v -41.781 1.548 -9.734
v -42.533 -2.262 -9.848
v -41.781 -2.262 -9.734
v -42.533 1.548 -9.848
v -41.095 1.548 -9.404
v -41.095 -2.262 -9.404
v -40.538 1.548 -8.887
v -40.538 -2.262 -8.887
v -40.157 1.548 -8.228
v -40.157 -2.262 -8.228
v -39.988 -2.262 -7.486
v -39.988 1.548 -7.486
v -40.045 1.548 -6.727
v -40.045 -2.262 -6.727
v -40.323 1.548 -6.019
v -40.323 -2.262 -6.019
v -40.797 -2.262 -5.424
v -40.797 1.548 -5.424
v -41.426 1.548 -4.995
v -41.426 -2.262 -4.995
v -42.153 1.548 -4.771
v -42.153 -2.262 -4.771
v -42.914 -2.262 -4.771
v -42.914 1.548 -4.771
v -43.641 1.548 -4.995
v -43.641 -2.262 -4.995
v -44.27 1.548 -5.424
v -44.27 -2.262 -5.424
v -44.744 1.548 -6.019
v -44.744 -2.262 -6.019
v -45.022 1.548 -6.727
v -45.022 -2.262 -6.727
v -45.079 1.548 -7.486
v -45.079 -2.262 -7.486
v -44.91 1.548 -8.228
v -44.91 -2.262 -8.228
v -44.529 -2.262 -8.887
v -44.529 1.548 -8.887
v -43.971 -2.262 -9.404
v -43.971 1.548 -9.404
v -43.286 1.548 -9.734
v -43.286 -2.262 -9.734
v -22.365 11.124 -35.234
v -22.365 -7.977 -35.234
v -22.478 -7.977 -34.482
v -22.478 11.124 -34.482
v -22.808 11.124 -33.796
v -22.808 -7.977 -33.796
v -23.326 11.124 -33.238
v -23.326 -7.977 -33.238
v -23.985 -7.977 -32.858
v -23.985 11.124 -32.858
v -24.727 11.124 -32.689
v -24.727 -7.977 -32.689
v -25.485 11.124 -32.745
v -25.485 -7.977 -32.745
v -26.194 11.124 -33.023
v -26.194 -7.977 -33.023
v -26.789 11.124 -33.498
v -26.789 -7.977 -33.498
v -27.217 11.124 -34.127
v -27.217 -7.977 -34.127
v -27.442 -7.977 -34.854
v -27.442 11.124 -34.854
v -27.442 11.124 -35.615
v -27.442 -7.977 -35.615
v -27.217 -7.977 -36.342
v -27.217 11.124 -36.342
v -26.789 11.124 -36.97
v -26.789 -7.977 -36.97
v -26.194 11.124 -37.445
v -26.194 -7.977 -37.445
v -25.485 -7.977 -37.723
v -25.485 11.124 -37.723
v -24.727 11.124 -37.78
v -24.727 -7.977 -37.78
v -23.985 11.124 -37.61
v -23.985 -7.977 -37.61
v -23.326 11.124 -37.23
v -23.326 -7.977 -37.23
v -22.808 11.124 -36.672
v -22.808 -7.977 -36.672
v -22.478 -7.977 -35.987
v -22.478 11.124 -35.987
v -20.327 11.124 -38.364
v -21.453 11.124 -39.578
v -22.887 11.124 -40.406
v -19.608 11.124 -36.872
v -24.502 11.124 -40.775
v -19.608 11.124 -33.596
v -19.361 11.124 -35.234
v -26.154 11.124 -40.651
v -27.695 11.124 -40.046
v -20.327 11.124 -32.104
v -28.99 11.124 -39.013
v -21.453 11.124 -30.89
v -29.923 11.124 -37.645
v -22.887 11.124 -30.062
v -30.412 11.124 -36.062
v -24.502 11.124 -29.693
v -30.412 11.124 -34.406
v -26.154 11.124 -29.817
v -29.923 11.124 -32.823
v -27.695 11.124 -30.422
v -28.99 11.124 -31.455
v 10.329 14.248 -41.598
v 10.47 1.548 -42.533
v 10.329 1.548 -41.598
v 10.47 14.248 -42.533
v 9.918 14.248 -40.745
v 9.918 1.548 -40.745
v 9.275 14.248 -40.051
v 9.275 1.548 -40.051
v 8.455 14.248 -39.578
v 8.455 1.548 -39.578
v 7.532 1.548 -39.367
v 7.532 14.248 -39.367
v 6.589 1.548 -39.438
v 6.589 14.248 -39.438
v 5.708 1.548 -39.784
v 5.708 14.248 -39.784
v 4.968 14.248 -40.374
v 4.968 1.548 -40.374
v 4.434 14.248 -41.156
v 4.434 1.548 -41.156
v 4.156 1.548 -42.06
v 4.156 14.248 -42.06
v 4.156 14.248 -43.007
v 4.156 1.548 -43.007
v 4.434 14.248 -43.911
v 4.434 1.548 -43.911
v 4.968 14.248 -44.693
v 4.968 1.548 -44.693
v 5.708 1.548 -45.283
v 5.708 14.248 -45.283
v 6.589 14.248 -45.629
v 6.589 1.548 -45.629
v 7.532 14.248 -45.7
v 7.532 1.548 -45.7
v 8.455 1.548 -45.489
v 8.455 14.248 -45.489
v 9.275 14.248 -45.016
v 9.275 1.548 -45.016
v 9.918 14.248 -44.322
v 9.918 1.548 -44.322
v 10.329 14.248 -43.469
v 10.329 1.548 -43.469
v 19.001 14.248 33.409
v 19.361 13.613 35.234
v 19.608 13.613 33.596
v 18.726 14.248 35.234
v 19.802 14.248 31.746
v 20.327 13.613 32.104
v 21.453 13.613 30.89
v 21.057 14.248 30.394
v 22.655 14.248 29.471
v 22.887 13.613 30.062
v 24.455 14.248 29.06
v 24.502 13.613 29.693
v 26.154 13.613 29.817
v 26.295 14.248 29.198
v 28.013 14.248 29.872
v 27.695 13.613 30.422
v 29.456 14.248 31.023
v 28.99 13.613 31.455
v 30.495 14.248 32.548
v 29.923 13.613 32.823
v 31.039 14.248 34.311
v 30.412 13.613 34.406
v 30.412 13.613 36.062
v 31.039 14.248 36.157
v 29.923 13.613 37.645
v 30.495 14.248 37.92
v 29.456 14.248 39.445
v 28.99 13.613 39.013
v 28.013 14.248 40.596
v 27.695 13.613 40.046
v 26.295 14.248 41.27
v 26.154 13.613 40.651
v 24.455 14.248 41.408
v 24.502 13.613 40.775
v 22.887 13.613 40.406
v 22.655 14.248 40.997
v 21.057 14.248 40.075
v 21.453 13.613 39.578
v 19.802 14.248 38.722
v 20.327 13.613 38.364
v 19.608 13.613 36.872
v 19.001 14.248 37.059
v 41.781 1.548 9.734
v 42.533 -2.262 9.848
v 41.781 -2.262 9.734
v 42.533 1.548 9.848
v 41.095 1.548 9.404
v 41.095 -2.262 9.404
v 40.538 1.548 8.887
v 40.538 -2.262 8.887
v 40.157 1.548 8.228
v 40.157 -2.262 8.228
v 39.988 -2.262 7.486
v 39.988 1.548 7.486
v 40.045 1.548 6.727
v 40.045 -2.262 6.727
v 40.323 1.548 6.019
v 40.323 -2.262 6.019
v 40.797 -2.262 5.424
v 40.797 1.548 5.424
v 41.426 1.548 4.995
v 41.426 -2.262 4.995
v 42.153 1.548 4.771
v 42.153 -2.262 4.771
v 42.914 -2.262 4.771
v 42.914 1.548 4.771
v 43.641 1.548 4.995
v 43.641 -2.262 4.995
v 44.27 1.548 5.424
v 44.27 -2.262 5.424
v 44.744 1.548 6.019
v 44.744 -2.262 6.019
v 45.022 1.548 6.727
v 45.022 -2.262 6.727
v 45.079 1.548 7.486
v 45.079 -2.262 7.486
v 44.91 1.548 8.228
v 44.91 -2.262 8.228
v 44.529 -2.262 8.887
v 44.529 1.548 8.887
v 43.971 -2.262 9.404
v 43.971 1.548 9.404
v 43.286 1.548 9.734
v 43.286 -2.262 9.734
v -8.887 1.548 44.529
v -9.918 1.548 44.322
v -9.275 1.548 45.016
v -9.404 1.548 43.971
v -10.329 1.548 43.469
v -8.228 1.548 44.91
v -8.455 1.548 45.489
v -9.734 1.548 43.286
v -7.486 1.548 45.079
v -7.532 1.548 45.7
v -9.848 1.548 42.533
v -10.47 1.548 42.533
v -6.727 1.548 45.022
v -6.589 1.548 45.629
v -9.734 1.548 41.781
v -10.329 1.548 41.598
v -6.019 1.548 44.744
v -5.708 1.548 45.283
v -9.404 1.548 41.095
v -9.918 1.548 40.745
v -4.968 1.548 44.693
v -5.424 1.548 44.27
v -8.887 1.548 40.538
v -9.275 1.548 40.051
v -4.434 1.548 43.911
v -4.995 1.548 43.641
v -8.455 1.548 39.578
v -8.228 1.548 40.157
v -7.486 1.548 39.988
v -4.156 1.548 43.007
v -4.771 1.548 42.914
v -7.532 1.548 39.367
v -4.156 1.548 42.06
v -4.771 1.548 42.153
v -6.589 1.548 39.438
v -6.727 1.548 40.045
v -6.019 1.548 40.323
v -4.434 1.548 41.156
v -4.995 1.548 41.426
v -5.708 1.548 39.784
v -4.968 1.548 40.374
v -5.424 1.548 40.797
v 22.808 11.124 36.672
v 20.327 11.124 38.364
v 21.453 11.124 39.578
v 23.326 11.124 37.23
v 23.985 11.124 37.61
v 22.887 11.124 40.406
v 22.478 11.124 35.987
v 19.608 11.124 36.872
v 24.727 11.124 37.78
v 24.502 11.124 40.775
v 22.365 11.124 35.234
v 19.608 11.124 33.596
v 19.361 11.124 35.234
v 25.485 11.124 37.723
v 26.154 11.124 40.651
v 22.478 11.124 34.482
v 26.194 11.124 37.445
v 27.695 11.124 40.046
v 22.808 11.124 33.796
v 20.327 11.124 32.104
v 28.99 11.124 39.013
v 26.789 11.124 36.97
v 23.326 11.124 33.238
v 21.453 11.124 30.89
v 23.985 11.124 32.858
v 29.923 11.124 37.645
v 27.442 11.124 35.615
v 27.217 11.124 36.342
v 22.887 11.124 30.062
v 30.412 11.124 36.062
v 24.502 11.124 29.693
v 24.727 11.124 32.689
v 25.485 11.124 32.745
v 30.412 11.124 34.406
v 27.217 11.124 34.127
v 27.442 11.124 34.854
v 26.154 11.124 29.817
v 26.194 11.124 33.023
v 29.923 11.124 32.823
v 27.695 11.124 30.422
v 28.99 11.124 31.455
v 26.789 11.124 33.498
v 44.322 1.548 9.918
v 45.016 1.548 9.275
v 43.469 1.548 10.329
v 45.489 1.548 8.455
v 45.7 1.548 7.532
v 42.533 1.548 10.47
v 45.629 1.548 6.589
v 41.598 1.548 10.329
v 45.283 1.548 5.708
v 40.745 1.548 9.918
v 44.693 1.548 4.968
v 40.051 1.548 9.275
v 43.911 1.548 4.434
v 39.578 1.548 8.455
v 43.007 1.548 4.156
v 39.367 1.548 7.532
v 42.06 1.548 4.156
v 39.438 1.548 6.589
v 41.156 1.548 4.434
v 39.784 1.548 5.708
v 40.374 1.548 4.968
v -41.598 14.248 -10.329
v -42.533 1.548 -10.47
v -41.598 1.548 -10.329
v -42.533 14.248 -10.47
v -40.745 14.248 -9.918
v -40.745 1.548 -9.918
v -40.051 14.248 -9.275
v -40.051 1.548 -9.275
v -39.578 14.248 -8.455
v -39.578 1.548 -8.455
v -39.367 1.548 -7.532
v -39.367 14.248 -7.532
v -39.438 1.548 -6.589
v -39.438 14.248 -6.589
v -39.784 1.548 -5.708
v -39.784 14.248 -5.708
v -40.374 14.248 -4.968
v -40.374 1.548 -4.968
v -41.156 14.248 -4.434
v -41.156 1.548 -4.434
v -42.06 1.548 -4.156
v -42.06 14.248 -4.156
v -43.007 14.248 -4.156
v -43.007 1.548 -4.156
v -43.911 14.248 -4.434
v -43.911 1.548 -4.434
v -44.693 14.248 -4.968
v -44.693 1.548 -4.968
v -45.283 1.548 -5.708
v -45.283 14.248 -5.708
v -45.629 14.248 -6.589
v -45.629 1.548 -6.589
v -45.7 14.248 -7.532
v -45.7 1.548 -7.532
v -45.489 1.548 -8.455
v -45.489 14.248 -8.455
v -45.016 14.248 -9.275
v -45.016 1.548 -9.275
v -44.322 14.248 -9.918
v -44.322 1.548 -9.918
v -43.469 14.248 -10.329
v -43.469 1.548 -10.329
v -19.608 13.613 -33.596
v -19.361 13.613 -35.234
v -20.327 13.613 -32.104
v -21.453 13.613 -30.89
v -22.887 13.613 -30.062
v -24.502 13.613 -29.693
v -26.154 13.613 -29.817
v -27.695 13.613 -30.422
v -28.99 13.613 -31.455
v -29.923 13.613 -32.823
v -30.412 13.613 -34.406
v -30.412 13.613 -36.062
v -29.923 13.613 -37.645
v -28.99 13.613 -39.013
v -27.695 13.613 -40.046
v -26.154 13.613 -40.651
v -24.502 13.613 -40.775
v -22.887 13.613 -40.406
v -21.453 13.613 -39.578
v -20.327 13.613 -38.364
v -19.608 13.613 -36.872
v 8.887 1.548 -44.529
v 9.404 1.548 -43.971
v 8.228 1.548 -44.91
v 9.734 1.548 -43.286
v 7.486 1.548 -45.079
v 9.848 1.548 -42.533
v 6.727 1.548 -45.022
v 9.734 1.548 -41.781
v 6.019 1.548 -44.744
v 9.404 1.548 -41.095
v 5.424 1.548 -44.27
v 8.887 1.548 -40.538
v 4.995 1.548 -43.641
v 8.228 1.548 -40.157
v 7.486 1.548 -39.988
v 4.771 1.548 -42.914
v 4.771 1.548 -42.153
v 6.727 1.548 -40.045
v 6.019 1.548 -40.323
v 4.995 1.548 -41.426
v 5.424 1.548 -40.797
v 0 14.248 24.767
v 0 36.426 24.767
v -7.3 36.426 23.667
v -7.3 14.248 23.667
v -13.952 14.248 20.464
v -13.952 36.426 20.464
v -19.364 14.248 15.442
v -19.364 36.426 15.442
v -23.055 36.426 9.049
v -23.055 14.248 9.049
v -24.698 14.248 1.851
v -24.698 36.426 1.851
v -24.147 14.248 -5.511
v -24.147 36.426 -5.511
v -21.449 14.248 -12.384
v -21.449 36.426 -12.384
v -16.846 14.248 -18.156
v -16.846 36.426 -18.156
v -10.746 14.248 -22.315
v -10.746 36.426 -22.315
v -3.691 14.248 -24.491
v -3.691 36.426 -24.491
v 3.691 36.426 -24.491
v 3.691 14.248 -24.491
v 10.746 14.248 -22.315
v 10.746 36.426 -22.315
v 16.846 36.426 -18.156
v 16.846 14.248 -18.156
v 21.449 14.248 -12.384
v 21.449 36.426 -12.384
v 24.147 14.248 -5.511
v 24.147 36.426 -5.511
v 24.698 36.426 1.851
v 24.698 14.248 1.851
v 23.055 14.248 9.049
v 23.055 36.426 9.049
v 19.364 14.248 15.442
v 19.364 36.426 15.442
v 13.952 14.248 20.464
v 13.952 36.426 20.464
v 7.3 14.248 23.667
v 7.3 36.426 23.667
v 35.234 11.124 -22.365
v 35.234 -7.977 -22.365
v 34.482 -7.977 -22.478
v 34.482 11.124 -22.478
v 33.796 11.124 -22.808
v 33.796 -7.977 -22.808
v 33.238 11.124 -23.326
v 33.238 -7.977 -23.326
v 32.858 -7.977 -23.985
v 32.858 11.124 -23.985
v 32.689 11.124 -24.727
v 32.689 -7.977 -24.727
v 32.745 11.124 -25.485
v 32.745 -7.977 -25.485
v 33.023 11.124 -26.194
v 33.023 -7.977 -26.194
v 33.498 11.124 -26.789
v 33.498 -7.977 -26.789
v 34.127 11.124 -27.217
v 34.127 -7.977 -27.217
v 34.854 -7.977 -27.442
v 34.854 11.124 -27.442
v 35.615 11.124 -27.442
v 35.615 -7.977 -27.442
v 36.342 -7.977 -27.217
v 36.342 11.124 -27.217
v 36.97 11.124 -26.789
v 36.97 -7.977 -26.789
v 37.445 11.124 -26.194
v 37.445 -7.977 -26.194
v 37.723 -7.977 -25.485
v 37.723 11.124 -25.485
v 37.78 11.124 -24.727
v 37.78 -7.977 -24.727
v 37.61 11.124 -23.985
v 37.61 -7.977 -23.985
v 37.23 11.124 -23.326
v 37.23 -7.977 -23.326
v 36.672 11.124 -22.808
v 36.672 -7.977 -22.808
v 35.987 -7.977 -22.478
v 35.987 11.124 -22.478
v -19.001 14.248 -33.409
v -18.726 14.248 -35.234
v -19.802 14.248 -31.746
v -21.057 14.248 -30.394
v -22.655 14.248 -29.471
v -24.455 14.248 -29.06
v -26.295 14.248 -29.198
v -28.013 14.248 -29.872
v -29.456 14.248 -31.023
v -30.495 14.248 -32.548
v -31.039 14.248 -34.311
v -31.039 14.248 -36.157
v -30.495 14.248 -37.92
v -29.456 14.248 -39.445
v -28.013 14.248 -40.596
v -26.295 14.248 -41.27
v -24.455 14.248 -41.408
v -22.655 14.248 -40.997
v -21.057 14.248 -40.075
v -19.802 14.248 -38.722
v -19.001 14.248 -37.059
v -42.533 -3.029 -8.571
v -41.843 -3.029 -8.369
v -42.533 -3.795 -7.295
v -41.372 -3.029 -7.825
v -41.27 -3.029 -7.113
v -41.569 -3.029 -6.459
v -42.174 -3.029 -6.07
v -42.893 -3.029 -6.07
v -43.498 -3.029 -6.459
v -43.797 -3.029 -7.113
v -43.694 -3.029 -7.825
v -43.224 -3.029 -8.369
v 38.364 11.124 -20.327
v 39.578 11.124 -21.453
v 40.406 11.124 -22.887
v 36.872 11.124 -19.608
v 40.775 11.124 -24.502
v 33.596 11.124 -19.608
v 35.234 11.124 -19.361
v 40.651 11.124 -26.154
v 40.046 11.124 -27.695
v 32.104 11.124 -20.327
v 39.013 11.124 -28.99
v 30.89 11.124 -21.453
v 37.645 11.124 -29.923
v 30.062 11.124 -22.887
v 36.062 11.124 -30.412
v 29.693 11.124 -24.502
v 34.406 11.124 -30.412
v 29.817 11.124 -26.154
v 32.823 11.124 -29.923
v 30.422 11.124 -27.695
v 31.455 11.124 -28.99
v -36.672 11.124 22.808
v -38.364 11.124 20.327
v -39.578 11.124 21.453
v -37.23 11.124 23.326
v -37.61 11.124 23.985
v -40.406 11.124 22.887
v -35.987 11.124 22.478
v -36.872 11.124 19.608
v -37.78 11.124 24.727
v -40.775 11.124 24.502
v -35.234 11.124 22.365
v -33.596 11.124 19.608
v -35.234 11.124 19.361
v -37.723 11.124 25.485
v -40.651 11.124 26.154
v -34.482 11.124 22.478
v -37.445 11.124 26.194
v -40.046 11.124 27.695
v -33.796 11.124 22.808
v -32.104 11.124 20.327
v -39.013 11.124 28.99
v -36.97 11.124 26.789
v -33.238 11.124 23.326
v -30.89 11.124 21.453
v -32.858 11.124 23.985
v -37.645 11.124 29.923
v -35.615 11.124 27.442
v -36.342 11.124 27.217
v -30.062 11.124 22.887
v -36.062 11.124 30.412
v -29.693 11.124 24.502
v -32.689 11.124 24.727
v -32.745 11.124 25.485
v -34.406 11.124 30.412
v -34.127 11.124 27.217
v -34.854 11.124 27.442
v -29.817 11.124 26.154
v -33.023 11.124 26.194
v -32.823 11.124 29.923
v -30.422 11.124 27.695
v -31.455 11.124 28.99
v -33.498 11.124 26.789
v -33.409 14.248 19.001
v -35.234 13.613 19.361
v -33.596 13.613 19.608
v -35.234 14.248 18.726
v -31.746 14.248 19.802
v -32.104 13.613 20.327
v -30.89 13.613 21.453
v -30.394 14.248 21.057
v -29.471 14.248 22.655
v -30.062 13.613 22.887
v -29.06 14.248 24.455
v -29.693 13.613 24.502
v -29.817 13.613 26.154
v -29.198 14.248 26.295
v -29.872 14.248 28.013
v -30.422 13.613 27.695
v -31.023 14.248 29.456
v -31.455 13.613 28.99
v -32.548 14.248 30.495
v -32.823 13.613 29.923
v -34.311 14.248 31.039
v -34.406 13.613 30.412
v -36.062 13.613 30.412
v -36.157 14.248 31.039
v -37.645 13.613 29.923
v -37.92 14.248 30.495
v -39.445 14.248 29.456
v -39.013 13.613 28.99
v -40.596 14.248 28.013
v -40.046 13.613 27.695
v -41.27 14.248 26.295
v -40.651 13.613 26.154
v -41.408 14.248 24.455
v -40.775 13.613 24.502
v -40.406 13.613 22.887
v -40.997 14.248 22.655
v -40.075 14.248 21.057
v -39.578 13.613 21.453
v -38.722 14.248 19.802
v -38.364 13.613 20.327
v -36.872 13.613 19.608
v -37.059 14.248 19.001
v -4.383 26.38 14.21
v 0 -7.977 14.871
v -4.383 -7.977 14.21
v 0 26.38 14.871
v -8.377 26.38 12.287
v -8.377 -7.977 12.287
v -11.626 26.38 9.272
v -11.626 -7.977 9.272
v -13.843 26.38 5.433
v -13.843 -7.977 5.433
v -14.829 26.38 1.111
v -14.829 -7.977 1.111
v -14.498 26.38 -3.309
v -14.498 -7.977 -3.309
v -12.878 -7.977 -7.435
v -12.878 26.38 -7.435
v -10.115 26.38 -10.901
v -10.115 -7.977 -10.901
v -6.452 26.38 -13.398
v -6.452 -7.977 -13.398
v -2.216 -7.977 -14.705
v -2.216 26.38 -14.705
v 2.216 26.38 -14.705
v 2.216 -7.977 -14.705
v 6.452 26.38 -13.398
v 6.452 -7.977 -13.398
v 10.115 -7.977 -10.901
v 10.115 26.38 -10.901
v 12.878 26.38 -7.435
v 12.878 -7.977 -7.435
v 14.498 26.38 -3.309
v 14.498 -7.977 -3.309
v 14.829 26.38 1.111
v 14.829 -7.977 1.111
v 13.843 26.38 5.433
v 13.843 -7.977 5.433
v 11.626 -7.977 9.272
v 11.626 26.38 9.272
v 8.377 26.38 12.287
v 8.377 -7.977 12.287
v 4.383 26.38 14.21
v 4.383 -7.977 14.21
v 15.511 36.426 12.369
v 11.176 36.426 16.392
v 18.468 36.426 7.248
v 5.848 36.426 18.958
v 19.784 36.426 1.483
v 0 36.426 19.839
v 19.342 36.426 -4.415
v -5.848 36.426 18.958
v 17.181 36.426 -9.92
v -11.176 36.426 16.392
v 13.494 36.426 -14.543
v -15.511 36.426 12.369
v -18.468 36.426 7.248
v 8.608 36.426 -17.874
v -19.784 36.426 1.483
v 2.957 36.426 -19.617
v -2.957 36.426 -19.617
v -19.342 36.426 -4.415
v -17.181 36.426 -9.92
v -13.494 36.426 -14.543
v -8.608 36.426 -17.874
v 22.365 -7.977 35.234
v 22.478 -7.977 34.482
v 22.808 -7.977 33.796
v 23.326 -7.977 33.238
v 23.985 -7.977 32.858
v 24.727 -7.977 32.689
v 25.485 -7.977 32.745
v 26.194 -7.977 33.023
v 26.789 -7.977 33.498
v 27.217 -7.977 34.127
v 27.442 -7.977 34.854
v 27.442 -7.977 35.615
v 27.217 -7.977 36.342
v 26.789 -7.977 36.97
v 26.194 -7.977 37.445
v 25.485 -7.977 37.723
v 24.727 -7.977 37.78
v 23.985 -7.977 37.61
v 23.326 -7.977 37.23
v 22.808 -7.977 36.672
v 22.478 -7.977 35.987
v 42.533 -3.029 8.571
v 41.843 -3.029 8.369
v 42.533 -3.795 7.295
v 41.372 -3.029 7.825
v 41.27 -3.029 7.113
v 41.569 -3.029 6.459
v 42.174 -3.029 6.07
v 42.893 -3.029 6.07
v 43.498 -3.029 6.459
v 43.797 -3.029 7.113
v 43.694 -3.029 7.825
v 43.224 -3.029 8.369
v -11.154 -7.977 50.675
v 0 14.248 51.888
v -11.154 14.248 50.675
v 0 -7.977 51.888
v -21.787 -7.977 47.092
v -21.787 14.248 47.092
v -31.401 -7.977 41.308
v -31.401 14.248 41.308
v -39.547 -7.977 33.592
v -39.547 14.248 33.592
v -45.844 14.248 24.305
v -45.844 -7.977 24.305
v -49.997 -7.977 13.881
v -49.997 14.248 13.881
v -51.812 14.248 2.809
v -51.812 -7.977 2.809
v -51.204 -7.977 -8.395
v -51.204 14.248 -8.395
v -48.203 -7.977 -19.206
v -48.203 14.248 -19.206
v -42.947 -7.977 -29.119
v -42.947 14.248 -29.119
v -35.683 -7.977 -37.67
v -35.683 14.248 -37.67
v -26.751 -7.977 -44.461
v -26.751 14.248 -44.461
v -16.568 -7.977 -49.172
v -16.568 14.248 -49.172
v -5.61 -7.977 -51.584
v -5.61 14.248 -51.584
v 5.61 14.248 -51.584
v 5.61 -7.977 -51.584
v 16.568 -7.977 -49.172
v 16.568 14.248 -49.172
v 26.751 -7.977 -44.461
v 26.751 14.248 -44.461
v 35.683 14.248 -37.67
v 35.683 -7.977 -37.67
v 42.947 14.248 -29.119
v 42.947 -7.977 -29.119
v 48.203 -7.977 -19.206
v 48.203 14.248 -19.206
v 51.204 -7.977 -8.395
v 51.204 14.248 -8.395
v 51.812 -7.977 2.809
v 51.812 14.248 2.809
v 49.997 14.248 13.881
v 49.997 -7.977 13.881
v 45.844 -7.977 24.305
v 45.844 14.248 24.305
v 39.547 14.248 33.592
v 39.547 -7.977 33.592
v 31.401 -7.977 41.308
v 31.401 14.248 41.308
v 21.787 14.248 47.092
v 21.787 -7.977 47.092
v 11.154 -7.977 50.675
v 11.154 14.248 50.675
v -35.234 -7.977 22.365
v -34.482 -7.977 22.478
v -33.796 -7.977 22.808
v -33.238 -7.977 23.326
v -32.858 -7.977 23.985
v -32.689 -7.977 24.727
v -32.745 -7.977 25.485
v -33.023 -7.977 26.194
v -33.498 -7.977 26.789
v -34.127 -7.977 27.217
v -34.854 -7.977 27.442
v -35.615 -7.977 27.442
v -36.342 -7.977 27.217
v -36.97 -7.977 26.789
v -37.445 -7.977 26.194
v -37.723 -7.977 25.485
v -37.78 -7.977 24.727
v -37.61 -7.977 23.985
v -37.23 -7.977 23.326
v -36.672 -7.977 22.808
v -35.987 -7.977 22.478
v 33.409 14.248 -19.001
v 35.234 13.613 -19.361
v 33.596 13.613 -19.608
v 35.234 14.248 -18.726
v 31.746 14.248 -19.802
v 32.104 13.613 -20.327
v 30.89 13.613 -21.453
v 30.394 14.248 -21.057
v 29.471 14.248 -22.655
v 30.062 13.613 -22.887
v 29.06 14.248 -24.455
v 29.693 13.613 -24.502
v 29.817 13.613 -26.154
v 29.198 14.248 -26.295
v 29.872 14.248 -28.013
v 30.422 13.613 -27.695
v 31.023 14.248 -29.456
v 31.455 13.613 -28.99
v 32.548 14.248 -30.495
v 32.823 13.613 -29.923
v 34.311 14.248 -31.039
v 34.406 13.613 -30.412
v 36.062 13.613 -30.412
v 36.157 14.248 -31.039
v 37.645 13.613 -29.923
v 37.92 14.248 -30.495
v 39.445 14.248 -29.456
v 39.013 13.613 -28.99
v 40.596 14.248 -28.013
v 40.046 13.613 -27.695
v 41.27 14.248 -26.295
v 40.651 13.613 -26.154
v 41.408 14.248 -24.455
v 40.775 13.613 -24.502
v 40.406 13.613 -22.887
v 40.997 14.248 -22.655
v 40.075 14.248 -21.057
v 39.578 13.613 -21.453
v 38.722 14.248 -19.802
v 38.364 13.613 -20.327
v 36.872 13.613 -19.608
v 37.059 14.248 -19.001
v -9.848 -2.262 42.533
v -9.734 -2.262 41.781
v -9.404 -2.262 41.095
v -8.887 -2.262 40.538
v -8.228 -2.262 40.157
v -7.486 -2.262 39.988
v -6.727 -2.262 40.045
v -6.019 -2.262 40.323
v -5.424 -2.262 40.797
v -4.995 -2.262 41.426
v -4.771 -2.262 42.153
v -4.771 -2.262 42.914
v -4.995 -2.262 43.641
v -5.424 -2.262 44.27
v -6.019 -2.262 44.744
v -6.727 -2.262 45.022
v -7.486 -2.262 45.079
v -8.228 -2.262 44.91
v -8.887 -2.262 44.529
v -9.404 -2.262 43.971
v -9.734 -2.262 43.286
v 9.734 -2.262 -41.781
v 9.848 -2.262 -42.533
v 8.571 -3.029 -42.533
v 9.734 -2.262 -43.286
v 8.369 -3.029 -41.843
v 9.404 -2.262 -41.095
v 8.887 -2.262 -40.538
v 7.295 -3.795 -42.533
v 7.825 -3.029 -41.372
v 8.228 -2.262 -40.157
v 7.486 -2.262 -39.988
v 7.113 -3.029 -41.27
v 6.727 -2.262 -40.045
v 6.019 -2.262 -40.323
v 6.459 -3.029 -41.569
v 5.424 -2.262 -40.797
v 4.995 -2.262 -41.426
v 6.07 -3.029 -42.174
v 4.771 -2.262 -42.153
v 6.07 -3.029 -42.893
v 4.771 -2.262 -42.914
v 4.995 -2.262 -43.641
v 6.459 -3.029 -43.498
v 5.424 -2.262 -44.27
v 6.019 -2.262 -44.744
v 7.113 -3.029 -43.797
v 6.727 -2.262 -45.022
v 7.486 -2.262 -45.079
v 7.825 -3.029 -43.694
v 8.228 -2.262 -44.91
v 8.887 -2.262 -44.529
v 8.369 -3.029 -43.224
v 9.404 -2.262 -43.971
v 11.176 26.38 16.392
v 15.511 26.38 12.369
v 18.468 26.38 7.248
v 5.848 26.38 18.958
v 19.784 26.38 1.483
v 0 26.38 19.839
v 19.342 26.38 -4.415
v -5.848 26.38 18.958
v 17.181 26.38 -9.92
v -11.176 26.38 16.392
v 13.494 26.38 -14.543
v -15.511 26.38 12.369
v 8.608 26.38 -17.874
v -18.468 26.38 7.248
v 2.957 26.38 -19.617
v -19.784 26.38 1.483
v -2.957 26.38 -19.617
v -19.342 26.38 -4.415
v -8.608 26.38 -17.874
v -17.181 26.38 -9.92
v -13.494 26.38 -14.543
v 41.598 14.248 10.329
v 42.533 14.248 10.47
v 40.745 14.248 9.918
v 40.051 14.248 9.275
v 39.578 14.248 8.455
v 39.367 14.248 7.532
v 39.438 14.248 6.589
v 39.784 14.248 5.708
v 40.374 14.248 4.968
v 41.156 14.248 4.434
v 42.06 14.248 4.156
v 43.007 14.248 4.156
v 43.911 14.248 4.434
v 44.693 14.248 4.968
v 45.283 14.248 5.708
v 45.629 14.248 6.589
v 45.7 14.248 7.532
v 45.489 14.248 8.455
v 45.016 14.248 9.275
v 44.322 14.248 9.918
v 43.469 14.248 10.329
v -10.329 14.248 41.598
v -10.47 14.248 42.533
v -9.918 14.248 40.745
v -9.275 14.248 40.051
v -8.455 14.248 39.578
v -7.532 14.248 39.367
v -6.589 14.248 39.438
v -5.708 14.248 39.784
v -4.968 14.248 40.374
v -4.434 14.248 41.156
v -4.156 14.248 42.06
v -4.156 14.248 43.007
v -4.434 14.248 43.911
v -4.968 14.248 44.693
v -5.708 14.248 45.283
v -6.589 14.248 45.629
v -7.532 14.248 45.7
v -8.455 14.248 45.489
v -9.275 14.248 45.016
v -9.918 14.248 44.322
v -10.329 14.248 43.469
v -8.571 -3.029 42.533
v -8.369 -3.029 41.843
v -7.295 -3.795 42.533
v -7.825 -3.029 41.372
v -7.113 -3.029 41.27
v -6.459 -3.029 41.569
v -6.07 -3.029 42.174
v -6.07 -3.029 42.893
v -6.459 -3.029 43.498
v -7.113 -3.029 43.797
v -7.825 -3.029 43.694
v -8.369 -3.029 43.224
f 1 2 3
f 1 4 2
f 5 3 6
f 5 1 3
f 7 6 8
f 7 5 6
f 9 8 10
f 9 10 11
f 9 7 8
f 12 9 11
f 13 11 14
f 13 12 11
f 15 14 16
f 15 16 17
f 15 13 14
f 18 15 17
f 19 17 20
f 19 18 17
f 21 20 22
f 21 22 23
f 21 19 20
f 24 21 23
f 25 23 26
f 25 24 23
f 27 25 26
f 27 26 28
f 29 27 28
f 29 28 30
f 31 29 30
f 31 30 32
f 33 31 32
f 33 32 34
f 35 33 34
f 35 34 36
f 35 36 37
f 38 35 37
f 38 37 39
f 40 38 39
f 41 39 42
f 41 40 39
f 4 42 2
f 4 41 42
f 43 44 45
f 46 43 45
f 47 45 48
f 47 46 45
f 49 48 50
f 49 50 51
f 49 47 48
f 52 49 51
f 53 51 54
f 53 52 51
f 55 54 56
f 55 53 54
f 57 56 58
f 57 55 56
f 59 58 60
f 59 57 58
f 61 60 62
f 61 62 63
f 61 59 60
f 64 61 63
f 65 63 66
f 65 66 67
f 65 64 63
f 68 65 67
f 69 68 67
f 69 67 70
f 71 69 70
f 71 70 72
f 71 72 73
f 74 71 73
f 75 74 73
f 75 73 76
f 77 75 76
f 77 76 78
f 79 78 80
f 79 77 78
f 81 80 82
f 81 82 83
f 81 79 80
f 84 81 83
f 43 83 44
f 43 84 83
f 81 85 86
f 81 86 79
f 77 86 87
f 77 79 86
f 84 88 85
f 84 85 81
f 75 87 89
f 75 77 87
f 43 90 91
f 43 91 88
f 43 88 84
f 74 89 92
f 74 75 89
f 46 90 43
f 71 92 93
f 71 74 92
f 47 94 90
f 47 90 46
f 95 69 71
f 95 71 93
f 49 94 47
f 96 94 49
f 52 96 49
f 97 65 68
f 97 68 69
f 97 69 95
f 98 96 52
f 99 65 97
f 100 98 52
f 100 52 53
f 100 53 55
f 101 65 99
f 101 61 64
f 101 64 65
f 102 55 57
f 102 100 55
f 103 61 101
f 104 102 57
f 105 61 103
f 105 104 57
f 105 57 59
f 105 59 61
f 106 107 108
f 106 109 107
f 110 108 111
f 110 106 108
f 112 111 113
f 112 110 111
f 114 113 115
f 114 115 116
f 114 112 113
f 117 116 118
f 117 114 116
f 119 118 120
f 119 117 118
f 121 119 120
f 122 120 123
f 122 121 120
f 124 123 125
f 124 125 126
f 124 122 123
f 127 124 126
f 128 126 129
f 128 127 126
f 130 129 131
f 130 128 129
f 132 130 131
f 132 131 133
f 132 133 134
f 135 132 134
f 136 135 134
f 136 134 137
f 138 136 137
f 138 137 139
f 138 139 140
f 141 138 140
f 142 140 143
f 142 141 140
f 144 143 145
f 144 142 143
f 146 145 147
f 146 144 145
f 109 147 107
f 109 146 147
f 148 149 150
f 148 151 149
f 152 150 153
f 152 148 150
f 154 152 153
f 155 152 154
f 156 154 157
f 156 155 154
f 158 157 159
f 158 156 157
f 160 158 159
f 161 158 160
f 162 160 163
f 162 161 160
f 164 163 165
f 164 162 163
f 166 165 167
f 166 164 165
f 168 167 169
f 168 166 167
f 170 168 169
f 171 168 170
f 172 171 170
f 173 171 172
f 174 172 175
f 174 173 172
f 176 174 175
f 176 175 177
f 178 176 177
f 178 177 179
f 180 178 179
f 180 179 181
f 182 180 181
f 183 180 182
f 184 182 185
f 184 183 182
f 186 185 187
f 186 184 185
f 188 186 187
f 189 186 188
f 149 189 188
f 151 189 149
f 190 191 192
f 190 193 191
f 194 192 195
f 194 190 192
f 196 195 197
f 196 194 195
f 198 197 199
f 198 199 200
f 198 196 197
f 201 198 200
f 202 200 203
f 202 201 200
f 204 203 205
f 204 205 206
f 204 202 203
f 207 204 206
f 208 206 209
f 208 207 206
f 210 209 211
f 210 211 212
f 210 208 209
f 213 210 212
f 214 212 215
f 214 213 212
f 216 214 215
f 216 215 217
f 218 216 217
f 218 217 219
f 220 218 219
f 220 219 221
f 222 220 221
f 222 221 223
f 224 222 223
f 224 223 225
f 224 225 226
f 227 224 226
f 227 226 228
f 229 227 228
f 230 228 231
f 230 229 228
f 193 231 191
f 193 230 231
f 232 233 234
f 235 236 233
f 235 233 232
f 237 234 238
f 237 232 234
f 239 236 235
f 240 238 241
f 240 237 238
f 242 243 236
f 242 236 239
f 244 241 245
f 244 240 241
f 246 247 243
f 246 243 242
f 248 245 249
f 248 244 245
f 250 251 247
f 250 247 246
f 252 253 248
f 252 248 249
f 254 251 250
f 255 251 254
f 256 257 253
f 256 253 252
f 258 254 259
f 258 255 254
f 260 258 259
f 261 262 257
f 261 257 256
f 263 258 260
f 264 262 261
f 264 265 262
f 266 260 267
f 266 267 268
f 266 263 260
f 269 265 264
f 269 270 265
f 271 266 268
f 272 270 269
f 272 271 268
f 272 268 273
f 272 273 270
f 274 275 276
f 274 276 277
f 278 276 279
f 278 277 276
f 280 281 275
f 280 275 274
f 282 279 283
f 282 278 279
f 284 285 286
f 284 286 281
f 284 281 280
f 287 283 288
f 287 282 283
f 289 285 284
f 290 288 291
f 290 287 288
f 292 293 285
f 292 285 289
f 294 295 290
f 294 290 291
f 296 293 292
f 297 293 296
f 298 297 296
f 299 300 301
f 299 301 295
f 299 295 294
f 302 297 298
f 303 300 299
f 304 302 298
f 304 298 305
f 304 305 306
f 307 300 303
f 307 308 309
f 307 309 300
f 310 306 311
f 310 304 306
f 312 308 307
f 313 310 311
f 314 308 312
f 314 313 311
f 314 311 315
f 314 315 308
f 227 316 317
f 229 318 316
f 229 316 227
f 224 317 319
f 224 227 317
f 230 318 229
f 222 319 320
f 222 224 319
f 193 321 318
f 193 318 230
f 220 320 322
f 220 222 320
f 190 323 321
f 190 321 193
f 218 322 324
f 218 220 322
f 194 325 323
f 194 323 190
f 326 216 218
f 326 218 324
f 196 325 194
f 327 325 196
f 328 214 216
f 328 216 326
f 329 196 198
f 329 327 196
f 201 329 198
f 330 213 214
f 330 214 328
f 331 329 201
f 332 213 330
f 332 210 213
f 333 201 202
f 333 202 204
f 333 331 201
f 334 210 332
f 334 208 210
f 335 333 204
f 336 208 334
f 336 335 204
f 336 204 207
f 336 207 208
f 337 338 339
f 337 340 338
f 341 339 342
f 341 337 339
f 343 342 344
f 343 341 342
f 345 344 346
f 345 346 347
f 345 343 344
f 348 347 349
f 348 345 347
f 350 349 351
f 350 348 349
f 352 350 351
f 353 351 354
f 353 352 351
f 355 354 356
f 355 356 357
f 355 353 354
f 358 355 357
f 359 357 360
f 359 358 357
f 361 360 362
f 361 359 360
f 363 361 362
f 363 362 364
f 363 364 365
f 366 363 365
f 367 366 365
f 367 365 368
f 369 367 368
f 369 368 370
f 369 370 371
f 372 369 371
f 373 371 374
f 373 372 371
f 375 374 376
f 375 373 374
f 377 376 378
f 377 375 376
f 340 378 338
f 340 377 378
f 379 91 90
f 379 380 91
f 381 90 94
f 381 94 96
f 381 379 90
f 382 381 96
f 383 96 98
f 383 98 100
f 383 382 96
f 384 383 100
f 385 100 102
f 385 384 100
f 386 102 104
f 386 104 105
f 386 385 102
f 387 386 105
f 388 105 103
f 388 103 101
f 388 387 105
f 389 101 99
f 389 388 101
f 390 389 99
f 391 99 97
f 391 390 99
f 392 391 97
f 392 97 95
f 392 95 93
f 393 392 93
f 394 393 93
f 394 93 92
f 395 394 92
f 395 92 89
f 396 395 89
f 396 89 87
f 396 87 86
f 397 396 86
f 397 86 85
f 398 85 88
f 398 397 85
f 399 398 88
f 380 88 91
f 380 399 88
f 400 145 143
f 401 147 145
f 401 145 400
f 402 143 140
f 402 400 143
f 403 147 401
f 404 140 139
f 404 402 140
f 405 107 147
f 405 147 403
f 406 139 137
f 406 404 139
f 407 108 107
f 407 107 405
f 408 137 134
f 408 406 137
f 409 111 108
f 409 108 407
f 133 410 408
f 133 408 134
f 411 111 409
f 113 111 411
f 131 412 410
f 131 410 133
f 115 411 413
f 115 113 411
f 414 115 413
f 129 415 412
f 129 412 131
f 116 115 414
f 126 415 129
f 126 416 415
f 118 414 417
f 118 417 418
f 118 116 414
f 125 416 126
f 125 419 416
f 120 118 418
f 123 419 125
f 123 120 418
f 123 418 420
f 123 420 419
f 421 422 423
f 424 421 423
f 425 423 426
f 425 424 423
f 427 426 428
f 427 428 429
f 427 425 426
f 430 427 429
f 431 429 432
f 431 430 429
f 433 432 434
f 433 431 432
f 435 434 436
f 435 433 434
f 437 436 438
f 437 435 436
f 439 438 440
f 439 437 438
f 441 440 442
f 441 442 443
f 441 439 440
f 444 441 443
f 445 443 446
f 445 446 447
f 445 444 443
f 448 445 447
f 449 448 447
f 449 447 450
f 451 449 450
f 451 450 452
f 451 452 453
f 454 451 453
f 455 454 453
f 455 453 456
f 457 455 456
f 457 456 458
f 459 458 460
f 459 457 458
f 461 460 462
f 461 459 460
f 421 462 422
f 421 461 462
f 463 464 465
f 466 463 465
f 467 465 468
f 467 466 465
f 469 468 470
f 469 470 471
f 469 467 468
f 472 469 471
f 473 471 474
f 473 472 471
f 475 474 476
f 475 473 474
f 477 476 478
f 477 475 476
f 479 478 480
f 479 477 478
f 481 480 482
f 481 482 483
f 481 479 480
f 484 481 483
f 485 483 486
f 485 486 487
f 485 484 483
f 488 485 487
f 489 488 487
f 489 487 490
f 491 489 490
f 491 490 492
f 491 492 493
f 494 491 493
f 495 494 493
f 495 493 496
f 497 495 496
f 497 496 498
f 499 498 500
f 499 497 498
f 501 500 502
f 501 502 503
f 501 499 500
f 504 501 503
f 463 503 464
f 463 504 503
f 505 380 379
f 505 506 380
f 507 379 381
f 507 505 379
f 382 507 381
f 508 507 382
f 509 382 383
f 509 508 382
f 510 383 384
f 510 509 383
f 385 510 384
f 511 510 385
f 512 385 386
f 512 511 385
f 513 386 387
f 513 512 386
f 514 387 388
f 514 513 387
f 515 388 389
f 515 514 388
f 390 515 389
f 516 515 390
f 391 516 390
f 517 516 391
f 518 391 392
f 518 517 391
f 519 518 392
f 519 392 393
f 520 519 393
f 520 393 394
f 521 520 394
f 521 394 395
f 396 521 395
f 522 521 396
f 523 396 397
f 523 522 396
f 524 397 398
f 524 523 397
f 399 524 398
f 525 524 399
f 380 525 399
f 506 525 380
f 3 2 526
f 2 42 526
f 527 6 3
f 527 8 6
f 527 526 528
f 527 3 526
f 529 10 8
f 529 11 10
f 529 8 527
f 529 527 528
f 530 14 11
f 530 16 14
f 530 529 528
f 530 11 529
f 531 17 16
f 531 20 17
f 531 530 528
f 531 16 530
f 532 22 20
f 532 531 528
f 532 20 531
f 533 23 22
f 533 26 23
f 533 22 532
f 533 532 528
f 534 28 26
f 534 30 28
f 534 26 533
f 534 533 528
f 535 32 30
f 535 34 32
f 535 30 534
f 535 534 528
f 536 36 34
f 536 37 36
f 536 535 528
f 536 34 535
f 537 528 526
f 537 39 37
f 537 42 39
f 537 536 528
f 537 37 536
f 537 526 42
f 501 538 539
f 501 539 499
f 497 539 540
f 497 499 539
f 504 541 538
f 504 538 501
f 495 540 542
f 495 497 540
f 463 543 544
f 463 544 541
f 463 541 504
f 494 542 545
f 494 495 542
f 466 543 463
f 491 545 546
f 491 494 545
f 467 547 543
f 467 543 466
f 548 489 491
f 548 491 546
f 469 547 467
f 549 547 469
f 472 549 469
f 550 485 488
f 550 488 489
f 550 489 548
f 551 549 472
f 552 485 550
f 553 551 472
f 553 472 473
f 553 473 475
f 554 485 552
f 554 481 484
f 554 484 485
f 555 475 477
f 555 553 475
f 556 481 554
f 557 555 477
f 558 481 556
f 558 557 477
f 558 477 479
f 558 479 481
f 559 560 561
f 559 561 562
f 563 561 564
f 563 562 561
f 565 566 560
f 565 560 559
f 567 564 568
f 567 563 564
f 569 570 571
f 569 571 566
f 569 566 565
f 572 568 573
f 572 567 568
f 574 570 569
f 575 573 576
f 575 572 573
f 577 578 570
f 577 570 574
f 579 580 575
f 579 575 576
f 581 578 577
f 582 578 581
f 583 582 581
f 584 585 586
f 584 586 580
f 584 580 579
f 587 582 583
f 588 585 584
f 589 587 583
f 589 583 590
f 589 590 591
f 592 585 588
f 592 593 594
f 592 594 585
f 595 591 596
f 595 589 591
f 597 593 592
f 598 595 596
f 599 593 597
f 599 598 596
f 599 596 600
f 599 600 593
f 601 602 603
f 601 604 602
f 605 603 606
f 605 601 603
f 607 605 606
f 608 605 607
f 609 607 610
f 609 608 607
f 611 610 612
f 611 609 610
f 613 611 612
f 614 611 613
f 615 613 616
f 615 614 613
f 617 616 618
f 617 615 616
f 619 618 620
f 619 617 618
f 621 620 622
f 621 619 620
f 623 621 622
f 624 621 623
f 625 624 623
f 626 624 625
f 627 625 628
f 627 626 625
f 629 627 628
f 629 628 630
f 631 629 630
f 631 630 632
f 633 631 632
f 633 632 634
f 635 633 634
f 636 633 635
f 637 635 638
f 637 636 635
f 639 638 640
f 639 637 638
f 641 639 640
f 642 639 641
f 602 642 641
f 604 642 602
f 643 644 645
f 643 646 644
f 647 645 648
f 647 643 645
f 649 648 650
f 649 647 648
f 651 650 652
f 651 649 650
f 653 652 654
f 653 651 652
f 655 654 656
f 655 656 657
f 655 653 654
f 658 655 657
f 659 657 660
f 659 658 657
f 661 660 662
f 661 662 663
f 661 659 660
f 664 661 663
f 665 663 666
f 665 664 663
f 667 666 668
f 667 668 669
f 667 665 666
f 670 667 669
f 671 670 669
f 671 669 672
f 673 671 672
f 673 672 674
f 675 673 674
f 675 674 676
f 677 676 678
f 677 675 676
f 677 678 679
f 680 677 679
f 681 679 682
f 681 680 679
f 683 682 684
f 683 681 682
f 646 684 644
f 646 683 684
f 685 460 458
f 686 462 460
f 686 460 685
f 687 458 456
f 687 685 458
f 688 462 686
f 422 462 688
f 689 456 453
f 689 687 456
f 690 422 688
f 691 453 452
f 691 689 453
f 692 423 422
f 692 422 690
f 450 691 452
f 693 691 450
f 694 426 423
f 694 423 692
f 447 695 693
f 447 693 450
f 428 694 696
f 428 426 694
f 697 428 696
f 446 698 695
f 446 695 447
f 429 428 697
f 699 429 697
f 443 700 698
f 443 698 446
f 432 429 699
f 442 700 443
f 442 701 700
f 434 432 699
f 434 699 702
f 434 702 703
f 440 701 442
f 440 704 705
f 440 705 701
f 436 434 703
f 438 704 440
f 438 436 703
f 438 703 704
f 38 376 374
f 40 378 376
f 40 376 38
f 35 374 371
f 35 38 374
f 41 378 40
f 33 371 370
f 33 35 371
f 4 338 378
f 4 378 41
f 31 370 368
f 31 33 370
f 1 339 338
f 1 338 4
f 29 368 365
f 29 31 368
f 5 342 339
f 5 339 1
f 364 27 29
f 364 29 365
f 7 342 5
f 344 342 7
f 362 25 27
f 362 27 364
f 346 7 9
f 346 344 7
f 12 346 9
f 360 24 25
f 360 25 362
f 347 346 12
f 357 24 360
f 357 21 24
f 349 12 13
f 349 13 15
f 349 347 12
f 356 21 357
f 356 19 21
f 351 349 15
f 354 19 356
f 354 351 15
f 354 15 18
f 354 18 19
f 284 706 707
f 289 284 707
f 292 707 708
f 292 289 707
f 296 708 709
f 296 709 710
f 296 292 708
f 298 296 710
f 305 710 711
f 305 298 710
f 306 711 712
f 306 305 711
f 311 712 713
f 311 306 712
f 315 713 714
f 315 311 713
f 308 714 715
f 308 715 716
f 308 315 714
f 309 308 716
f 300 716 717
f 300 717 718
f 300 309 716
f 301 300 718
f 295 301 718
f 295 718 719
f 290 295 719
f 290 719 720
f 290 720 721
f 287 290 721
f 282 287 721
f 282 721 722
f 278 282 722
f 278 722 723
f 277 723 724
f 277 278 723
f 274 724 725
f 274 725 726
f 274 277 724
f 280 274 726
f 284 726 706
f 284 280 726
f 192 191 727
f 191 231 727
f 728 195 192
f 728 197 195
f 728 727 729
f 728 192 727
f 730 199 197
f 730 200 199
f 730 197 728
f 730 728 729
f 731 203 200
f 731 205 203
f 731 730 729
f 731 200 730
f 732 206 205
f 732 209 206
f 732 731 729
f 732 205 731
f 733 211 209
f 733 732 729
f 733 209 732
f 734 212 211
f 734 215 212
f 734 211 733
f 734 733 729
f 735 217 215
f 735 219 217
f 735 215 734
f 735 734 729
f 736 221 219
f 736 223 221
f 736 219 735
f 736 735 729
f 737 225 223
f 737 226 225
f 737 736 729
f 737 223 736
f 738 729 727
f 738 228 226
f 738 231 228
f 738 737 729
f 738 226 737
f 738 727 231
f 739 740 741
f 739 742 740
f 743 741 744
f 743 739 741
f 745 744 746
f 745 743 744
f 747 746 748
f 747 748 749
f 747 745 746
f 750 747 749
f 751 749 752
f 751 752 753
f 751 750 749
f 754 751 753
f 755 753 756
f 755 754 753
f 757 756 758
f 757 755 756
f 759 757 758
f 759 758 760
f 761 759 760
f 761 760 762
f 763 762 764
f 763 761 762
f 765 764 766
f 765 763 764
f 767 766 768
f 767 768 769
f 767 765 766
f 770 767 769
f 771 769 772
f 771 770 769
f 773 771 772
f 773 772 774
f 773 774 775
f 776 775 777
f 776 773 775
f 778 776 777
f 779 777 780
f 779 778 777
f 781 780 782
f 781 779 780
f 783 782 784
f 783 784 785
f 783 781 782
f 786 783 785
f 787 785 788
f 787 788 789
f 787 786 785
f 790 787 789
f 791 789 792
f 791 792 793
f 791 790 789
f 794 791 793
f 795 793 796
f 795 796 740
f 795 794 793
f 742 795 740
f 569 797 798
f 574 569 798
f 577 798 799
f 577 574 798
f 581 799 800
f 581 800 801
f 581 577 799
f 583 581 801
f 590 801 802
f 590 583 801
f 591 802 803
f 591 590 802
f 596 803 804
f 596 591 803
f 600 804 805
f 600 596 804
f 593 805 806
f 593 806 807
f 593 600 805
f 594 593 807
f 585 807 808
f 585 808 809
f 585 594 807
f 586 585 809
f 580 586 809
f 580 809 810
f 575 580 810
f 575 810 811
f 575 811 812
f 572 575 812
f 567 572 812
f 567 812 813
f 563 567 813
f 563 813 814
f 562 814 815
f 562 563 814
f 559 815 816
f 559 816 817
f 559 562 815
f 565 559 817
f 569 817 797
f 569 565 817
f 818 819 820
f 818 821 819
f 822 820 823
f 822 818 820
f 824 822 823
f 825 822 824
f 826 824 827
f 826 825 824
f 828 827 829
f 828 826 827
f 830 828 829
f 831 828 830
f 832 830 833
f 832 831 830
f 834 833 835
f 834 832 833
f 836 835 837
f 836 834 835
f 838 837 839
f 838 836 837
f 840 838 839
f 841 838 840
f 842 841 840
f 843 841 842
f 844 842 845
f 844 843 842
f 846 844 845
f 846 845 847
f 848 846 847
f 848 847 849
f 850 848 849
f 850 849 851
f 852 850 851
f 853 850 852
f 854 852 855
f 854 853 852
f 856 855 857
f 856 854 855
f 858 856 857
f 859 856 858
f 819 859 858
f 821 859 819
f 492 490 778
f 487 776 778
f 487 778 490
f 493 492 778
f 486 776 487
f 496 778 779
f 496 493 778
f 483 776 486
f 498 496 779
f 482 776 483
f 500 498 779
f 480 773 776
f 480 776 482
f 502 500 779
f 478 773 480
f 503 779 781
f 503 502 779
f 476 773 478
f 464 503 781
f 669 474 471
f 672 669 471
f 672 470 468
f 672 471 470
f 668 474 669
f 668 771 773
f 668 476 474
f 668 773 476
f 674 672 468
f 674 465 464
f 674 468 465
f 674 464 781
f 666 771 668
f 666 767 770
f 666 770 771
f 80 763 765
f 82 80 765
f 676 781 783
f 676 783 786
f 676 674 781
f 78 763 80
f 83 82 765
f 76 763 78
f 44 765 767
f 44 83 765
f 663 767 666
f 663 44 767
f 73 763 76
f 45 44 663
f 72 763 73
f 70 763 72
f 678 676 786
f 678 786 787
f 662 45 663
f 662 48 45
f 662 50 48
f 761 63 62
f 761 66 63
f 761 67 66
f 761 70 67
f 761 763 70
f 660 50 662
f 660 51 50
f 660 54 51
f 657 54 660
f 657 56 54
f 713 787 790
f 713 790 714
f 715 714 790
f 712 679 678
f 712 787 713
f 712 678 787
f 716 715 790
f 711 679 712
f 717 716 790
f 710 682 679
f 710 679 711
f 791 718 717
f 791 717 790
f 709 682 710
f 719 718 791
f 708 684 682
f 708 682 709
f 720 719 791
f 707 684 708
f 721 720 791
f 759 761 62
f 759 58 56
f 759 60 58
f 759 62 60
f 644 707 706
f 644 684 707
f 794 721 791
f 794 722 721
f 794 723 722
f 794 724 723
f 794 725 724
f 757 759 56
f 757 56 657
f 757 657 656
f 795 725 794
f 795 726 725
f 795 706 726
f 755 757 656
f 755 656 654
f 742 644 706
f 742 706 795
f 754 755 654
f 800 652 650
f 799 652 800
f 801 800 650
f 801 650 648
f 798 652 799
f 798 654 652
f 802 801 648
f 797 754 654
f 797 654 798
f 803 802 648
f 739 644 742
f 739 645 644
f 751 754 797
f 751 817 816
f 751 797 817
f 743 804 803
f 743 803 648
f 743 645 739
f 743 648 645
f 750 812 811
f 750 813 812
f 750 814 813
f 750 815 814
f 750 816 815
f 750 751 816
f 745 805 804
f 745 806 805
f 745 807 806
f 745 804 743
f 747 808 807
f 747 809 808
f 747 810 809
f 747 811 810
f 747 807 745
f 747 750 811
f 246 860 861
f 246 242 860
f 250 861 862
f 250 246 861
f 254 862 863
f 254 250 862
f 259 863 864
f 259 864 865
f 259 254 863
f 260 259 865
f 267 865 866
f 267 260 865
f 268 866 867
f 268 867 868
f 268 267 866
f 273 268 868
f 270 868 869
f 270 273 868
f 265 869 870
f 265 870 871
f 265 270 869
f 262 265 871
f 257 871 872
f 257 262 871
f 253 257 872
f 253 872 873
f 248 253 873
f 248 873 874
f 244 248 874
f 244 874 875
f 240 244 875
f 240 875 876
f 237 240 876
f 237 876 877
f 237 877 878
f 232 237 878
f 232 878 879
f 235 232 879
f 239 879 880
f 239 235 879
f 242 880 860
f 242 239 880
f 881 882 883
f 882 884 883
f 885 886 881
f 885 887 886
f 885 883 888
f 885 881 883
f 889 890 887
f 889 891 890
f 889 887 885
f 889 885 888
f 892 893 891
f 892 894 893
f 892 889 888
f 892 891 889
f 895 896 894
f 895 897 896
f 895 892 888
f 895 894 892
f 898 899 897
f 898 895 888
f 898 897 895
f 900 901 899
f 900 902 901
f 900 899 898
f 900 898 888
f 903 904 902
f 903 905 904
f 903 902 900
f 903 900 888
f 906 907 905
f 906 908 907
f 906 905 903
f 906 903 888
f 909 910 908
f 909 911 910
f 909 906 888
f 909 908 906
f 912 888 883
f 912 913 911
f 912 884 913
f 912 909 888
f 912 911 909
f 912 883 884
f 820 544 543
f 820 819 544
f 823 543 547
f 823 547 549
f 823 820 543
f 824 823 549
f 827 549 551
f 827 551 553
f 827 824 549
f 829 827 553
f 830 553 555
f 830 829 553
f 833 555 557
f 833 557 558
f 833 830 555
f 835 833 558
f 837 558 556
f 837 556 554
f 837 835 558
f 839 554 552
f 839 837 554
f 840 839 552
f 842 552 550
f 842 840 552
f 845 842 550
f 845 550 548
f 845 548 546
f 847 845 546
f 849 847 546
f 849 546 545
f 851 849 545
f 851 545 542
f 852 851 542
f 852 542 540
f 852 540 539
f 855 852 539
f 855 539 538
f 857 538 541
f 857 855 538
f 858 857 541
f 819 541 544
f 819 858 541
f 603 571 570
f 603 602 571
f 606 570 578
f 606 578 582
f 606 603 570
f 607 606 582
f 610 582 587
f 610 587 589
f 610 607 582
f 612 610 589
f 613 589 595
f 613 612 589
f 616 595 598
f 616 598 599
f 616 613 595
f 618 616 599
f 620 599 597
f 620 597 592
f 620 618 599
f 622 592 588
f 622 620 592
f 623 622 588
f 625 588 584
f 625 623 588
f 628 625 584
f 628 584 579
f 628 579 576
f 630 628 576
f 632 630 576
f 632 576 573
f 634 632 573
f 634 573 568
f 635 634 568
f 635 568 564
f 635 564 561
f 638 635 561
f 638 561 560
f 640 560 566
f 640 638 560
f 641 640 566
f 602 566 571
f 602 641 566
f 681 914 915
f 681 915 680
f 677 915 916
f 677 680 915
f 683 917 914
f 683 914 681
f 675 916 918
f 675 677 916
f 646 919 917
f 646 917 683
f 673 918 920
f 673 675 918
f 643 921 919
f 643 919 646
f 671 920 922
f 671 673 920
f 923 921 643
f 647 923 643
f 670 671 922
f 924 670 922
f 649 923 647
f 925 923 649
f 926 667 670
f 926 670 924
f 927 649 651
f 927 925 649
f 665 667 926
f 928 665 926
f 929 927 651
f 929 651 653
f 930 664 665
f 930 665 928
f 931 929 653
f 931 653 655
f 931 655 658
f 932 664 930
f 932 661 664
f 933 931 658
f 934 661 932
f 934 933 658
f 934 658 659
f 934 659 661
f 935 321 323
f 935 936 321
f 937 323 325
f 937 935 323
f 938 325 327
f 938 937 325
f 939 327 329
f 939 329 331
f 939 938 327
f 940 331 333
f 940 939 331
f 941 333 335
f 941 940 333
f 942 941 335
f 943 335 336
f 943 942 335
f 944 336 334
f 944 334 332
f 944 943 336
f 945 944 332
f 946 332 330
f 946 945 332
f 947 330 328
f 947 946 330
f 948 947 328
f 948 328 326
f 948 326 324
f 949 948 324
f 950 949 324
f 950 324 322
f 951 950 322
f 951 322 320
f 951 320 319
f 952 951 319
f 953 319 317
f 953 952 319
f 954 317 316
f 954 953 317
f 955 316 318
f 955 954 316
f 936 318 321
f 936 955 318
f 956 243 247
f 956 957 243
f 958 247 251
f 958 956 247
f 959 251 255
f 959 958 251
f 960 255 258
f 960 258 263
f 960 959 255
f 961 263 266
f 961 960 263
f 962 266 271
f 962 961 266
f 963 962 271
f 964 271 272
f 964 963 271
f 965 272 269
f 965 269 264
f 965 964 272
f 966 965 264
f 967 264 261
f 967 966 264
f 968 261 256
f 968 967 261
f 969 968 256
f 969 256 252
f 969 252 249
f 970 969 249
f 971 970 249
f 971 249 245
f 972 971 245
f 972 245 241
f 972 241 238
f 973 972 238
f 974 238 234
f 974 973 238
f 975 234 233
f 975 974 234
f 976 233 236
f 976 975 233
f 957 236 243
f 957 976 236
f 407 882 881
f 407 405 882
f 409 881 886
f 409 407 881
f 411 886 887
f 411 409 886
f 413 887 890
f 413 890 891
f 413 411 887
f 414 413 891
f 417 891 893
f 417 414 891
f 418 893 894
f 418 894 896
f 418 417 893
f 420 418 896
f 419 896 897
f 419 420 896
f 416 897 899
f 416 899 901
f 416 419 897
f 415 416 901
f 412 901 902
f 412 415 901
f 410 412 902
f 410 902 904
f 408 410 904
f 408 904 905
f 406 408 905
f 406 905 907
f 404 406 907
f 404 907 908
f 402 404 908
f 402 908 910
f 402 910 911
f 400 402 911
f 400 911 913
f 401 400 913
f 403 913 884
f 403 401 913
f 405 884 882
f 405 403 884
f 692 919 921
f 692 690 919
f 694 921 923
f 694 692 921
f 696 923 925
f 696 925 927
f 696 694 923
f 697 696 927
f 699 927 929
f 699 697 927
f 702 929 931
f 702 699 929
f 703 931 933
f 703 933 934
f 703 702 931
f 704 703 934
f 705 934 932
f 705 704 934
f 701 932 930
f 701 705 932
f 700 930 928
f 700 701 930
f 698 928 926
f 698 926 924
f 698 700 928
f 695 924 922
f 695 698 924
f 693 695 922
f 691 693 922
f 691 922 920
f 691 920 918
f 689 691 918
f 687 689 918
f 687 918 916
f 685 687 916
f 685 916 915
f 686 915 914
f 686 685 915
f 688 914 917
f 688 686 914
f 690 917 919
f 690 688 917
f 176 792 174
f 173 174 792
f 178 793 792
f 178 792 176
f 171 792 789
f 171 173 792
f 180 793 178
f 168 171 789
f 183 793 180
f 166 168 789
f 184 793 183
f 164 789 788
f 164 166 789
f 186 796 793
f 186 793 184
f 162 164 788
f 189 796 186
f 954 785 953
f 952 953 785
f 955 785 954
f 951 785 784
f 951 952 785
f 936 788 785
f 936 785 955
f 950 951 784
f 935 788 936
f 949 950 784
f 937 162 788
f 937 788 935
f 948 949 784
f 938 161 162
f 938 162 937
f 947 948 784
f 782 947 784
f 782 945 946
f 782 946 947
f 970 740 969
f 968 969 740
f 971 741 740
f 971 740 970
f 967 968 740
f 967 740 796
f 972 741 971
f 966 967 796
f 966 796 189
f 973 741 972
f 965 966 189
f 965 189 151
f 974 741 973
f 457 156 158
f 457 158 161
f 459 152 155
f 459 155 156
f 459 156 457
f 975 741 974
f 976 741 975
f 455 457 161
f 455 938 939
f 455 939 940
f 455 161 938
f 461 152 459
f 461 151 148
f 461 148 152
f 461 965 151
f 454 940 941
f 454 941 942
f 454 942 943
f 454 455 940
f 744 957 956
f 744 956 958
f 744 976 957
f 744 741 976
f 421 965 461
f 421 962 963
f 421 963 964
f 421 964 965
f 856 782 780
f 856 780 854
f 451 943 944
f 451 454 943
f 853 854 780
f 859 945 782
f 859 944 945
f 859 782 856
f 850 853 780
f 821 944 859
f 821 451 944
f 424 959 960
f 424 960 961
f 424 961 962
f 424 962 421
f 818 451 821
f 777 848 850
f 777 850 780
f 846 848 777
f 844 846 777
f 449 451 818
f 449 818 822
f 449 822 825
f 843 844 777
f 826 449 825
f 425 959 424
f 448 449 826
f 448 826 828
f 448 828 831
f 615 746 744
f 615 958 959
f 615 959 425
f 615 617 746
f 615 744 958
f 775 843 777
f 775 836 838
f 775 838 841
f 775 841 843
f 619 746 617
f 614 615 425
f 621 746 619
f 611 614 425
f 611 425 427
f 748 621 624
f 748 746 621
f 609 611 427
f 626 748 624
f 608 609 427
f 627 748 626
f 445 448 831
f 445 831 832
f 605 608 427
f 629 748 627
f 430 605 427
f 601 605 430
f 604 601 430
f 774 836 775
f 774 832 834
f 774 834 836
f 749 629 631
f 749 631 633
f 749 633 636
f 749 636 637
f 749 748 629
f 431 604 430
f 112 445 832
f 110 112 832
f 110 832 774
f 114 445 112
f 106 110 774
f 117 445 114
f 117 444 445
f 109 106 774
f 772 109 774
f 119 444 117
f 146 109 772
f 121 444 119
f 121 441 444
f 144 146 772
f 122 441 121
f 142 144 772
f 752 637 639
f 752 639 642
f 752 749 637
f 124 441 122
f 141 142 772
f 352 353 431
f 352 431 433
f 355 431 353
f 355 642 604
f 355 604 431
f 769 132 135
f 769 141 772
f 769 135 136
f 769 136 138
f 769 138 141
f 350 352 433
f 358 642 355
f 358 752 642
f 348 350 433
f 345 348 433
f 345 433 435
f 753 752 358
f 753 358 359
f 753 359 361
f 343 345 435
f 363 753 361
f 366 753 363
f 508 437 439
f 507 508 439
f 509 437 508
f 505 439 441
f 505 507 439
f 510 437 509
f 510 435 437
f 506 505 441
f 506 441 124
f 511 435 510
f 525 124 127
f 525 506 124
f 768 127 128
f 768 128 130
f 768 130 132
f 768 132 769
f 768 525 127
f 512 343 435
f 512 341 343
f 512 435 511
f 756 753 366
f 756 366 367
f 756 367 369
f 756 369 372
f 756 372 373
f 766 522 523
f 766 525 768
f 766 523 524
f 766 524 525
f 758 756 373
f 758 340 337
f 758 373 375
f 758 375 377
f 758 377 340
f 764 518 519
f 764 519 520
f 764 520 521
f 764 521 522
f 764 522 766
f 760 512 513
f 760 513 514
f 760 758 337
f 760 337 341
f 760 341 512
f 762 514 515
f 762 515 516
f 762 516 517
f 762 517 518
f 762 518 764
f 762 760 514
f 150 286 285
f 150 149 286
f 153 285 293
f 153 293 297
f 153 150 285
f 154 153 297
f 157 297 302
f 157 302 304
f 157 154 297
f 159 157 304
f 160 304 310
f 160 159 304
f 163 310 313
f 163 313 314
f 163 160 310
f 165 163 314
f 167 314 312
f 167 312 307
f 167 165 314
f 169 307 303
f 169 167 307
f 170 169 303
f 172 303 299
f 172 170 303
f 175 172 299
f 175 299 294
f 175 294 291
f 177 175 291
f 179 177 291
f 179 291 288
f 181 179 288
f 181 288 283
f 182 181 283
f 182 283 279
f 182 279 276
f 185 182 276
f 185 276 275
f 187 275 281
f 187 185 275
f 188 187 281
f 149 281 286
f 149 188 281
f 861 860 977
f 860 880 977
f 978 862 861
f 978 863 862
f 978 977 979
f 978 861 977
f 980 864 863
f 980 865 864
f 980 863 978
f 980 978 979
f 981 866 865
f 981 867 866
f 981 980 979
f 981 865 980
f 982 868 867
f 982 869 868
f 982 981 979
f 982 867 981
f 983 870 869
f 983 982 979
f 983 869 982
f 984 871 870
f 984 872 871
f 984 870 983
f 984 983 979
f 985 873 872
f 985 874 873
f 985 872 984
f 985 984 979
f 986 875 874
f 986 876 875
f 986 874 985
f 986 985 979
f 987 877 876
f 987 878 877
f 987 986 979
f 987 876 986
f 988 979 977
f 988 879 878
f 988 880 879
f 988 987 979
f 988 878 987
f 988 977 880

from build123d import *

# Parameters (mm, degrees)
CIRPATTERN1_COUNT = 4
CIRPATTERN2_COUNT = 4


with BuildPart() as part:
    # Sketch1 → Revolve2 (revolve)
    with BuildSketch(Plane.XY, mode=Mode.PRIVATE) as revolve2_sk:
        Polygon((19.839067821, 36.426477833), (24.767495434, 36.426477833), (24.767495434, 14.248399015), (51.887938783, 14.248399015), (51.887938783, -7.976600985), (14.87066517, -7.976600985), (14.87066517, 26.379705263), (19.839067821, 26.379705263), align=None)
    revolve(revolve2_sk.sketch.rotate(Axis((0, 36.426477833, 0), (0, -1, 0)), 90), axis=Axis((0, 36.426477833, 0), (0, -1, 0)))

    # Sketch4 → 1/4-20 Tapped Hole2 (revolve, cut)
    with BuildSketch(Plane(origin=(42.533479959, 14.248399015, 7.295039057), x_dir=(0, 0, 1), z_dir=(1, 0, 0))):
        Polygon((0, 0), (0, 18.043816902), (2.5527, 16.51), (2.5527, 12.7), (3.175, 12.7), (3.175, 0), align=None)
    f_1_4_20_tapped_hole2 = revolve(axis=Axis((42.533479959, 20.598399015, 7.295039057), (0, -1, 0)), mode=Mode.SUBTRACT)

    # CirPattern1: 1/4-20 Tapped Hole2 ×4 about axis
    cirpattern1_axis = Axis((0, 0, 0), (0, 1, 0))
    for i in range(1, CIRPATTERN1_COUNT):
        add(f_1_4_20_tapped_hole2.rotate(cirpattern1_axis, i * 360 / CIRPATTERN1_COUNT), mode=Mode.SUBTRACT)

    # Sketch7 → CBORE for #10 Binding Head Machine Screw1 (revolve, cut)
    with BuildSketch(Plane(origin=(35.234083692, 14.248399015, -24.91734052), x_dir=(0, 0, 1), z_dir=(1, 0, 0))):
        Polygon((0, 0), (0, 22.225), (2.5527, 22.225), (2.5527, 3.1242), (5.55625, 3.1242), (5.55625, 0.635), (6.19125, 0), align=None)
    cbore_for_10_binding_head_machine_screw = revolve(axis=Axis((35.234083692, 20.598399015, -24.91734052), (0, -1, 0)), mode=Mode.SUBTRACT)

    # CirPattern2: CBORE for #10 Binding Head Machine Screw1 ×4 about axis
    cirpattern2_axis = Axis((0, 0, 0), (0, 1, 0))
    for i in range(1, CIRPATTERN2_COUNT):
        add(cbore_for_10_binding_head_machine_screw.rotate(cirpattern2_axis, i * 360 / CIRPATTERN2_COUNT), mode=Mode.SUBTRACT)


solid = part.part
